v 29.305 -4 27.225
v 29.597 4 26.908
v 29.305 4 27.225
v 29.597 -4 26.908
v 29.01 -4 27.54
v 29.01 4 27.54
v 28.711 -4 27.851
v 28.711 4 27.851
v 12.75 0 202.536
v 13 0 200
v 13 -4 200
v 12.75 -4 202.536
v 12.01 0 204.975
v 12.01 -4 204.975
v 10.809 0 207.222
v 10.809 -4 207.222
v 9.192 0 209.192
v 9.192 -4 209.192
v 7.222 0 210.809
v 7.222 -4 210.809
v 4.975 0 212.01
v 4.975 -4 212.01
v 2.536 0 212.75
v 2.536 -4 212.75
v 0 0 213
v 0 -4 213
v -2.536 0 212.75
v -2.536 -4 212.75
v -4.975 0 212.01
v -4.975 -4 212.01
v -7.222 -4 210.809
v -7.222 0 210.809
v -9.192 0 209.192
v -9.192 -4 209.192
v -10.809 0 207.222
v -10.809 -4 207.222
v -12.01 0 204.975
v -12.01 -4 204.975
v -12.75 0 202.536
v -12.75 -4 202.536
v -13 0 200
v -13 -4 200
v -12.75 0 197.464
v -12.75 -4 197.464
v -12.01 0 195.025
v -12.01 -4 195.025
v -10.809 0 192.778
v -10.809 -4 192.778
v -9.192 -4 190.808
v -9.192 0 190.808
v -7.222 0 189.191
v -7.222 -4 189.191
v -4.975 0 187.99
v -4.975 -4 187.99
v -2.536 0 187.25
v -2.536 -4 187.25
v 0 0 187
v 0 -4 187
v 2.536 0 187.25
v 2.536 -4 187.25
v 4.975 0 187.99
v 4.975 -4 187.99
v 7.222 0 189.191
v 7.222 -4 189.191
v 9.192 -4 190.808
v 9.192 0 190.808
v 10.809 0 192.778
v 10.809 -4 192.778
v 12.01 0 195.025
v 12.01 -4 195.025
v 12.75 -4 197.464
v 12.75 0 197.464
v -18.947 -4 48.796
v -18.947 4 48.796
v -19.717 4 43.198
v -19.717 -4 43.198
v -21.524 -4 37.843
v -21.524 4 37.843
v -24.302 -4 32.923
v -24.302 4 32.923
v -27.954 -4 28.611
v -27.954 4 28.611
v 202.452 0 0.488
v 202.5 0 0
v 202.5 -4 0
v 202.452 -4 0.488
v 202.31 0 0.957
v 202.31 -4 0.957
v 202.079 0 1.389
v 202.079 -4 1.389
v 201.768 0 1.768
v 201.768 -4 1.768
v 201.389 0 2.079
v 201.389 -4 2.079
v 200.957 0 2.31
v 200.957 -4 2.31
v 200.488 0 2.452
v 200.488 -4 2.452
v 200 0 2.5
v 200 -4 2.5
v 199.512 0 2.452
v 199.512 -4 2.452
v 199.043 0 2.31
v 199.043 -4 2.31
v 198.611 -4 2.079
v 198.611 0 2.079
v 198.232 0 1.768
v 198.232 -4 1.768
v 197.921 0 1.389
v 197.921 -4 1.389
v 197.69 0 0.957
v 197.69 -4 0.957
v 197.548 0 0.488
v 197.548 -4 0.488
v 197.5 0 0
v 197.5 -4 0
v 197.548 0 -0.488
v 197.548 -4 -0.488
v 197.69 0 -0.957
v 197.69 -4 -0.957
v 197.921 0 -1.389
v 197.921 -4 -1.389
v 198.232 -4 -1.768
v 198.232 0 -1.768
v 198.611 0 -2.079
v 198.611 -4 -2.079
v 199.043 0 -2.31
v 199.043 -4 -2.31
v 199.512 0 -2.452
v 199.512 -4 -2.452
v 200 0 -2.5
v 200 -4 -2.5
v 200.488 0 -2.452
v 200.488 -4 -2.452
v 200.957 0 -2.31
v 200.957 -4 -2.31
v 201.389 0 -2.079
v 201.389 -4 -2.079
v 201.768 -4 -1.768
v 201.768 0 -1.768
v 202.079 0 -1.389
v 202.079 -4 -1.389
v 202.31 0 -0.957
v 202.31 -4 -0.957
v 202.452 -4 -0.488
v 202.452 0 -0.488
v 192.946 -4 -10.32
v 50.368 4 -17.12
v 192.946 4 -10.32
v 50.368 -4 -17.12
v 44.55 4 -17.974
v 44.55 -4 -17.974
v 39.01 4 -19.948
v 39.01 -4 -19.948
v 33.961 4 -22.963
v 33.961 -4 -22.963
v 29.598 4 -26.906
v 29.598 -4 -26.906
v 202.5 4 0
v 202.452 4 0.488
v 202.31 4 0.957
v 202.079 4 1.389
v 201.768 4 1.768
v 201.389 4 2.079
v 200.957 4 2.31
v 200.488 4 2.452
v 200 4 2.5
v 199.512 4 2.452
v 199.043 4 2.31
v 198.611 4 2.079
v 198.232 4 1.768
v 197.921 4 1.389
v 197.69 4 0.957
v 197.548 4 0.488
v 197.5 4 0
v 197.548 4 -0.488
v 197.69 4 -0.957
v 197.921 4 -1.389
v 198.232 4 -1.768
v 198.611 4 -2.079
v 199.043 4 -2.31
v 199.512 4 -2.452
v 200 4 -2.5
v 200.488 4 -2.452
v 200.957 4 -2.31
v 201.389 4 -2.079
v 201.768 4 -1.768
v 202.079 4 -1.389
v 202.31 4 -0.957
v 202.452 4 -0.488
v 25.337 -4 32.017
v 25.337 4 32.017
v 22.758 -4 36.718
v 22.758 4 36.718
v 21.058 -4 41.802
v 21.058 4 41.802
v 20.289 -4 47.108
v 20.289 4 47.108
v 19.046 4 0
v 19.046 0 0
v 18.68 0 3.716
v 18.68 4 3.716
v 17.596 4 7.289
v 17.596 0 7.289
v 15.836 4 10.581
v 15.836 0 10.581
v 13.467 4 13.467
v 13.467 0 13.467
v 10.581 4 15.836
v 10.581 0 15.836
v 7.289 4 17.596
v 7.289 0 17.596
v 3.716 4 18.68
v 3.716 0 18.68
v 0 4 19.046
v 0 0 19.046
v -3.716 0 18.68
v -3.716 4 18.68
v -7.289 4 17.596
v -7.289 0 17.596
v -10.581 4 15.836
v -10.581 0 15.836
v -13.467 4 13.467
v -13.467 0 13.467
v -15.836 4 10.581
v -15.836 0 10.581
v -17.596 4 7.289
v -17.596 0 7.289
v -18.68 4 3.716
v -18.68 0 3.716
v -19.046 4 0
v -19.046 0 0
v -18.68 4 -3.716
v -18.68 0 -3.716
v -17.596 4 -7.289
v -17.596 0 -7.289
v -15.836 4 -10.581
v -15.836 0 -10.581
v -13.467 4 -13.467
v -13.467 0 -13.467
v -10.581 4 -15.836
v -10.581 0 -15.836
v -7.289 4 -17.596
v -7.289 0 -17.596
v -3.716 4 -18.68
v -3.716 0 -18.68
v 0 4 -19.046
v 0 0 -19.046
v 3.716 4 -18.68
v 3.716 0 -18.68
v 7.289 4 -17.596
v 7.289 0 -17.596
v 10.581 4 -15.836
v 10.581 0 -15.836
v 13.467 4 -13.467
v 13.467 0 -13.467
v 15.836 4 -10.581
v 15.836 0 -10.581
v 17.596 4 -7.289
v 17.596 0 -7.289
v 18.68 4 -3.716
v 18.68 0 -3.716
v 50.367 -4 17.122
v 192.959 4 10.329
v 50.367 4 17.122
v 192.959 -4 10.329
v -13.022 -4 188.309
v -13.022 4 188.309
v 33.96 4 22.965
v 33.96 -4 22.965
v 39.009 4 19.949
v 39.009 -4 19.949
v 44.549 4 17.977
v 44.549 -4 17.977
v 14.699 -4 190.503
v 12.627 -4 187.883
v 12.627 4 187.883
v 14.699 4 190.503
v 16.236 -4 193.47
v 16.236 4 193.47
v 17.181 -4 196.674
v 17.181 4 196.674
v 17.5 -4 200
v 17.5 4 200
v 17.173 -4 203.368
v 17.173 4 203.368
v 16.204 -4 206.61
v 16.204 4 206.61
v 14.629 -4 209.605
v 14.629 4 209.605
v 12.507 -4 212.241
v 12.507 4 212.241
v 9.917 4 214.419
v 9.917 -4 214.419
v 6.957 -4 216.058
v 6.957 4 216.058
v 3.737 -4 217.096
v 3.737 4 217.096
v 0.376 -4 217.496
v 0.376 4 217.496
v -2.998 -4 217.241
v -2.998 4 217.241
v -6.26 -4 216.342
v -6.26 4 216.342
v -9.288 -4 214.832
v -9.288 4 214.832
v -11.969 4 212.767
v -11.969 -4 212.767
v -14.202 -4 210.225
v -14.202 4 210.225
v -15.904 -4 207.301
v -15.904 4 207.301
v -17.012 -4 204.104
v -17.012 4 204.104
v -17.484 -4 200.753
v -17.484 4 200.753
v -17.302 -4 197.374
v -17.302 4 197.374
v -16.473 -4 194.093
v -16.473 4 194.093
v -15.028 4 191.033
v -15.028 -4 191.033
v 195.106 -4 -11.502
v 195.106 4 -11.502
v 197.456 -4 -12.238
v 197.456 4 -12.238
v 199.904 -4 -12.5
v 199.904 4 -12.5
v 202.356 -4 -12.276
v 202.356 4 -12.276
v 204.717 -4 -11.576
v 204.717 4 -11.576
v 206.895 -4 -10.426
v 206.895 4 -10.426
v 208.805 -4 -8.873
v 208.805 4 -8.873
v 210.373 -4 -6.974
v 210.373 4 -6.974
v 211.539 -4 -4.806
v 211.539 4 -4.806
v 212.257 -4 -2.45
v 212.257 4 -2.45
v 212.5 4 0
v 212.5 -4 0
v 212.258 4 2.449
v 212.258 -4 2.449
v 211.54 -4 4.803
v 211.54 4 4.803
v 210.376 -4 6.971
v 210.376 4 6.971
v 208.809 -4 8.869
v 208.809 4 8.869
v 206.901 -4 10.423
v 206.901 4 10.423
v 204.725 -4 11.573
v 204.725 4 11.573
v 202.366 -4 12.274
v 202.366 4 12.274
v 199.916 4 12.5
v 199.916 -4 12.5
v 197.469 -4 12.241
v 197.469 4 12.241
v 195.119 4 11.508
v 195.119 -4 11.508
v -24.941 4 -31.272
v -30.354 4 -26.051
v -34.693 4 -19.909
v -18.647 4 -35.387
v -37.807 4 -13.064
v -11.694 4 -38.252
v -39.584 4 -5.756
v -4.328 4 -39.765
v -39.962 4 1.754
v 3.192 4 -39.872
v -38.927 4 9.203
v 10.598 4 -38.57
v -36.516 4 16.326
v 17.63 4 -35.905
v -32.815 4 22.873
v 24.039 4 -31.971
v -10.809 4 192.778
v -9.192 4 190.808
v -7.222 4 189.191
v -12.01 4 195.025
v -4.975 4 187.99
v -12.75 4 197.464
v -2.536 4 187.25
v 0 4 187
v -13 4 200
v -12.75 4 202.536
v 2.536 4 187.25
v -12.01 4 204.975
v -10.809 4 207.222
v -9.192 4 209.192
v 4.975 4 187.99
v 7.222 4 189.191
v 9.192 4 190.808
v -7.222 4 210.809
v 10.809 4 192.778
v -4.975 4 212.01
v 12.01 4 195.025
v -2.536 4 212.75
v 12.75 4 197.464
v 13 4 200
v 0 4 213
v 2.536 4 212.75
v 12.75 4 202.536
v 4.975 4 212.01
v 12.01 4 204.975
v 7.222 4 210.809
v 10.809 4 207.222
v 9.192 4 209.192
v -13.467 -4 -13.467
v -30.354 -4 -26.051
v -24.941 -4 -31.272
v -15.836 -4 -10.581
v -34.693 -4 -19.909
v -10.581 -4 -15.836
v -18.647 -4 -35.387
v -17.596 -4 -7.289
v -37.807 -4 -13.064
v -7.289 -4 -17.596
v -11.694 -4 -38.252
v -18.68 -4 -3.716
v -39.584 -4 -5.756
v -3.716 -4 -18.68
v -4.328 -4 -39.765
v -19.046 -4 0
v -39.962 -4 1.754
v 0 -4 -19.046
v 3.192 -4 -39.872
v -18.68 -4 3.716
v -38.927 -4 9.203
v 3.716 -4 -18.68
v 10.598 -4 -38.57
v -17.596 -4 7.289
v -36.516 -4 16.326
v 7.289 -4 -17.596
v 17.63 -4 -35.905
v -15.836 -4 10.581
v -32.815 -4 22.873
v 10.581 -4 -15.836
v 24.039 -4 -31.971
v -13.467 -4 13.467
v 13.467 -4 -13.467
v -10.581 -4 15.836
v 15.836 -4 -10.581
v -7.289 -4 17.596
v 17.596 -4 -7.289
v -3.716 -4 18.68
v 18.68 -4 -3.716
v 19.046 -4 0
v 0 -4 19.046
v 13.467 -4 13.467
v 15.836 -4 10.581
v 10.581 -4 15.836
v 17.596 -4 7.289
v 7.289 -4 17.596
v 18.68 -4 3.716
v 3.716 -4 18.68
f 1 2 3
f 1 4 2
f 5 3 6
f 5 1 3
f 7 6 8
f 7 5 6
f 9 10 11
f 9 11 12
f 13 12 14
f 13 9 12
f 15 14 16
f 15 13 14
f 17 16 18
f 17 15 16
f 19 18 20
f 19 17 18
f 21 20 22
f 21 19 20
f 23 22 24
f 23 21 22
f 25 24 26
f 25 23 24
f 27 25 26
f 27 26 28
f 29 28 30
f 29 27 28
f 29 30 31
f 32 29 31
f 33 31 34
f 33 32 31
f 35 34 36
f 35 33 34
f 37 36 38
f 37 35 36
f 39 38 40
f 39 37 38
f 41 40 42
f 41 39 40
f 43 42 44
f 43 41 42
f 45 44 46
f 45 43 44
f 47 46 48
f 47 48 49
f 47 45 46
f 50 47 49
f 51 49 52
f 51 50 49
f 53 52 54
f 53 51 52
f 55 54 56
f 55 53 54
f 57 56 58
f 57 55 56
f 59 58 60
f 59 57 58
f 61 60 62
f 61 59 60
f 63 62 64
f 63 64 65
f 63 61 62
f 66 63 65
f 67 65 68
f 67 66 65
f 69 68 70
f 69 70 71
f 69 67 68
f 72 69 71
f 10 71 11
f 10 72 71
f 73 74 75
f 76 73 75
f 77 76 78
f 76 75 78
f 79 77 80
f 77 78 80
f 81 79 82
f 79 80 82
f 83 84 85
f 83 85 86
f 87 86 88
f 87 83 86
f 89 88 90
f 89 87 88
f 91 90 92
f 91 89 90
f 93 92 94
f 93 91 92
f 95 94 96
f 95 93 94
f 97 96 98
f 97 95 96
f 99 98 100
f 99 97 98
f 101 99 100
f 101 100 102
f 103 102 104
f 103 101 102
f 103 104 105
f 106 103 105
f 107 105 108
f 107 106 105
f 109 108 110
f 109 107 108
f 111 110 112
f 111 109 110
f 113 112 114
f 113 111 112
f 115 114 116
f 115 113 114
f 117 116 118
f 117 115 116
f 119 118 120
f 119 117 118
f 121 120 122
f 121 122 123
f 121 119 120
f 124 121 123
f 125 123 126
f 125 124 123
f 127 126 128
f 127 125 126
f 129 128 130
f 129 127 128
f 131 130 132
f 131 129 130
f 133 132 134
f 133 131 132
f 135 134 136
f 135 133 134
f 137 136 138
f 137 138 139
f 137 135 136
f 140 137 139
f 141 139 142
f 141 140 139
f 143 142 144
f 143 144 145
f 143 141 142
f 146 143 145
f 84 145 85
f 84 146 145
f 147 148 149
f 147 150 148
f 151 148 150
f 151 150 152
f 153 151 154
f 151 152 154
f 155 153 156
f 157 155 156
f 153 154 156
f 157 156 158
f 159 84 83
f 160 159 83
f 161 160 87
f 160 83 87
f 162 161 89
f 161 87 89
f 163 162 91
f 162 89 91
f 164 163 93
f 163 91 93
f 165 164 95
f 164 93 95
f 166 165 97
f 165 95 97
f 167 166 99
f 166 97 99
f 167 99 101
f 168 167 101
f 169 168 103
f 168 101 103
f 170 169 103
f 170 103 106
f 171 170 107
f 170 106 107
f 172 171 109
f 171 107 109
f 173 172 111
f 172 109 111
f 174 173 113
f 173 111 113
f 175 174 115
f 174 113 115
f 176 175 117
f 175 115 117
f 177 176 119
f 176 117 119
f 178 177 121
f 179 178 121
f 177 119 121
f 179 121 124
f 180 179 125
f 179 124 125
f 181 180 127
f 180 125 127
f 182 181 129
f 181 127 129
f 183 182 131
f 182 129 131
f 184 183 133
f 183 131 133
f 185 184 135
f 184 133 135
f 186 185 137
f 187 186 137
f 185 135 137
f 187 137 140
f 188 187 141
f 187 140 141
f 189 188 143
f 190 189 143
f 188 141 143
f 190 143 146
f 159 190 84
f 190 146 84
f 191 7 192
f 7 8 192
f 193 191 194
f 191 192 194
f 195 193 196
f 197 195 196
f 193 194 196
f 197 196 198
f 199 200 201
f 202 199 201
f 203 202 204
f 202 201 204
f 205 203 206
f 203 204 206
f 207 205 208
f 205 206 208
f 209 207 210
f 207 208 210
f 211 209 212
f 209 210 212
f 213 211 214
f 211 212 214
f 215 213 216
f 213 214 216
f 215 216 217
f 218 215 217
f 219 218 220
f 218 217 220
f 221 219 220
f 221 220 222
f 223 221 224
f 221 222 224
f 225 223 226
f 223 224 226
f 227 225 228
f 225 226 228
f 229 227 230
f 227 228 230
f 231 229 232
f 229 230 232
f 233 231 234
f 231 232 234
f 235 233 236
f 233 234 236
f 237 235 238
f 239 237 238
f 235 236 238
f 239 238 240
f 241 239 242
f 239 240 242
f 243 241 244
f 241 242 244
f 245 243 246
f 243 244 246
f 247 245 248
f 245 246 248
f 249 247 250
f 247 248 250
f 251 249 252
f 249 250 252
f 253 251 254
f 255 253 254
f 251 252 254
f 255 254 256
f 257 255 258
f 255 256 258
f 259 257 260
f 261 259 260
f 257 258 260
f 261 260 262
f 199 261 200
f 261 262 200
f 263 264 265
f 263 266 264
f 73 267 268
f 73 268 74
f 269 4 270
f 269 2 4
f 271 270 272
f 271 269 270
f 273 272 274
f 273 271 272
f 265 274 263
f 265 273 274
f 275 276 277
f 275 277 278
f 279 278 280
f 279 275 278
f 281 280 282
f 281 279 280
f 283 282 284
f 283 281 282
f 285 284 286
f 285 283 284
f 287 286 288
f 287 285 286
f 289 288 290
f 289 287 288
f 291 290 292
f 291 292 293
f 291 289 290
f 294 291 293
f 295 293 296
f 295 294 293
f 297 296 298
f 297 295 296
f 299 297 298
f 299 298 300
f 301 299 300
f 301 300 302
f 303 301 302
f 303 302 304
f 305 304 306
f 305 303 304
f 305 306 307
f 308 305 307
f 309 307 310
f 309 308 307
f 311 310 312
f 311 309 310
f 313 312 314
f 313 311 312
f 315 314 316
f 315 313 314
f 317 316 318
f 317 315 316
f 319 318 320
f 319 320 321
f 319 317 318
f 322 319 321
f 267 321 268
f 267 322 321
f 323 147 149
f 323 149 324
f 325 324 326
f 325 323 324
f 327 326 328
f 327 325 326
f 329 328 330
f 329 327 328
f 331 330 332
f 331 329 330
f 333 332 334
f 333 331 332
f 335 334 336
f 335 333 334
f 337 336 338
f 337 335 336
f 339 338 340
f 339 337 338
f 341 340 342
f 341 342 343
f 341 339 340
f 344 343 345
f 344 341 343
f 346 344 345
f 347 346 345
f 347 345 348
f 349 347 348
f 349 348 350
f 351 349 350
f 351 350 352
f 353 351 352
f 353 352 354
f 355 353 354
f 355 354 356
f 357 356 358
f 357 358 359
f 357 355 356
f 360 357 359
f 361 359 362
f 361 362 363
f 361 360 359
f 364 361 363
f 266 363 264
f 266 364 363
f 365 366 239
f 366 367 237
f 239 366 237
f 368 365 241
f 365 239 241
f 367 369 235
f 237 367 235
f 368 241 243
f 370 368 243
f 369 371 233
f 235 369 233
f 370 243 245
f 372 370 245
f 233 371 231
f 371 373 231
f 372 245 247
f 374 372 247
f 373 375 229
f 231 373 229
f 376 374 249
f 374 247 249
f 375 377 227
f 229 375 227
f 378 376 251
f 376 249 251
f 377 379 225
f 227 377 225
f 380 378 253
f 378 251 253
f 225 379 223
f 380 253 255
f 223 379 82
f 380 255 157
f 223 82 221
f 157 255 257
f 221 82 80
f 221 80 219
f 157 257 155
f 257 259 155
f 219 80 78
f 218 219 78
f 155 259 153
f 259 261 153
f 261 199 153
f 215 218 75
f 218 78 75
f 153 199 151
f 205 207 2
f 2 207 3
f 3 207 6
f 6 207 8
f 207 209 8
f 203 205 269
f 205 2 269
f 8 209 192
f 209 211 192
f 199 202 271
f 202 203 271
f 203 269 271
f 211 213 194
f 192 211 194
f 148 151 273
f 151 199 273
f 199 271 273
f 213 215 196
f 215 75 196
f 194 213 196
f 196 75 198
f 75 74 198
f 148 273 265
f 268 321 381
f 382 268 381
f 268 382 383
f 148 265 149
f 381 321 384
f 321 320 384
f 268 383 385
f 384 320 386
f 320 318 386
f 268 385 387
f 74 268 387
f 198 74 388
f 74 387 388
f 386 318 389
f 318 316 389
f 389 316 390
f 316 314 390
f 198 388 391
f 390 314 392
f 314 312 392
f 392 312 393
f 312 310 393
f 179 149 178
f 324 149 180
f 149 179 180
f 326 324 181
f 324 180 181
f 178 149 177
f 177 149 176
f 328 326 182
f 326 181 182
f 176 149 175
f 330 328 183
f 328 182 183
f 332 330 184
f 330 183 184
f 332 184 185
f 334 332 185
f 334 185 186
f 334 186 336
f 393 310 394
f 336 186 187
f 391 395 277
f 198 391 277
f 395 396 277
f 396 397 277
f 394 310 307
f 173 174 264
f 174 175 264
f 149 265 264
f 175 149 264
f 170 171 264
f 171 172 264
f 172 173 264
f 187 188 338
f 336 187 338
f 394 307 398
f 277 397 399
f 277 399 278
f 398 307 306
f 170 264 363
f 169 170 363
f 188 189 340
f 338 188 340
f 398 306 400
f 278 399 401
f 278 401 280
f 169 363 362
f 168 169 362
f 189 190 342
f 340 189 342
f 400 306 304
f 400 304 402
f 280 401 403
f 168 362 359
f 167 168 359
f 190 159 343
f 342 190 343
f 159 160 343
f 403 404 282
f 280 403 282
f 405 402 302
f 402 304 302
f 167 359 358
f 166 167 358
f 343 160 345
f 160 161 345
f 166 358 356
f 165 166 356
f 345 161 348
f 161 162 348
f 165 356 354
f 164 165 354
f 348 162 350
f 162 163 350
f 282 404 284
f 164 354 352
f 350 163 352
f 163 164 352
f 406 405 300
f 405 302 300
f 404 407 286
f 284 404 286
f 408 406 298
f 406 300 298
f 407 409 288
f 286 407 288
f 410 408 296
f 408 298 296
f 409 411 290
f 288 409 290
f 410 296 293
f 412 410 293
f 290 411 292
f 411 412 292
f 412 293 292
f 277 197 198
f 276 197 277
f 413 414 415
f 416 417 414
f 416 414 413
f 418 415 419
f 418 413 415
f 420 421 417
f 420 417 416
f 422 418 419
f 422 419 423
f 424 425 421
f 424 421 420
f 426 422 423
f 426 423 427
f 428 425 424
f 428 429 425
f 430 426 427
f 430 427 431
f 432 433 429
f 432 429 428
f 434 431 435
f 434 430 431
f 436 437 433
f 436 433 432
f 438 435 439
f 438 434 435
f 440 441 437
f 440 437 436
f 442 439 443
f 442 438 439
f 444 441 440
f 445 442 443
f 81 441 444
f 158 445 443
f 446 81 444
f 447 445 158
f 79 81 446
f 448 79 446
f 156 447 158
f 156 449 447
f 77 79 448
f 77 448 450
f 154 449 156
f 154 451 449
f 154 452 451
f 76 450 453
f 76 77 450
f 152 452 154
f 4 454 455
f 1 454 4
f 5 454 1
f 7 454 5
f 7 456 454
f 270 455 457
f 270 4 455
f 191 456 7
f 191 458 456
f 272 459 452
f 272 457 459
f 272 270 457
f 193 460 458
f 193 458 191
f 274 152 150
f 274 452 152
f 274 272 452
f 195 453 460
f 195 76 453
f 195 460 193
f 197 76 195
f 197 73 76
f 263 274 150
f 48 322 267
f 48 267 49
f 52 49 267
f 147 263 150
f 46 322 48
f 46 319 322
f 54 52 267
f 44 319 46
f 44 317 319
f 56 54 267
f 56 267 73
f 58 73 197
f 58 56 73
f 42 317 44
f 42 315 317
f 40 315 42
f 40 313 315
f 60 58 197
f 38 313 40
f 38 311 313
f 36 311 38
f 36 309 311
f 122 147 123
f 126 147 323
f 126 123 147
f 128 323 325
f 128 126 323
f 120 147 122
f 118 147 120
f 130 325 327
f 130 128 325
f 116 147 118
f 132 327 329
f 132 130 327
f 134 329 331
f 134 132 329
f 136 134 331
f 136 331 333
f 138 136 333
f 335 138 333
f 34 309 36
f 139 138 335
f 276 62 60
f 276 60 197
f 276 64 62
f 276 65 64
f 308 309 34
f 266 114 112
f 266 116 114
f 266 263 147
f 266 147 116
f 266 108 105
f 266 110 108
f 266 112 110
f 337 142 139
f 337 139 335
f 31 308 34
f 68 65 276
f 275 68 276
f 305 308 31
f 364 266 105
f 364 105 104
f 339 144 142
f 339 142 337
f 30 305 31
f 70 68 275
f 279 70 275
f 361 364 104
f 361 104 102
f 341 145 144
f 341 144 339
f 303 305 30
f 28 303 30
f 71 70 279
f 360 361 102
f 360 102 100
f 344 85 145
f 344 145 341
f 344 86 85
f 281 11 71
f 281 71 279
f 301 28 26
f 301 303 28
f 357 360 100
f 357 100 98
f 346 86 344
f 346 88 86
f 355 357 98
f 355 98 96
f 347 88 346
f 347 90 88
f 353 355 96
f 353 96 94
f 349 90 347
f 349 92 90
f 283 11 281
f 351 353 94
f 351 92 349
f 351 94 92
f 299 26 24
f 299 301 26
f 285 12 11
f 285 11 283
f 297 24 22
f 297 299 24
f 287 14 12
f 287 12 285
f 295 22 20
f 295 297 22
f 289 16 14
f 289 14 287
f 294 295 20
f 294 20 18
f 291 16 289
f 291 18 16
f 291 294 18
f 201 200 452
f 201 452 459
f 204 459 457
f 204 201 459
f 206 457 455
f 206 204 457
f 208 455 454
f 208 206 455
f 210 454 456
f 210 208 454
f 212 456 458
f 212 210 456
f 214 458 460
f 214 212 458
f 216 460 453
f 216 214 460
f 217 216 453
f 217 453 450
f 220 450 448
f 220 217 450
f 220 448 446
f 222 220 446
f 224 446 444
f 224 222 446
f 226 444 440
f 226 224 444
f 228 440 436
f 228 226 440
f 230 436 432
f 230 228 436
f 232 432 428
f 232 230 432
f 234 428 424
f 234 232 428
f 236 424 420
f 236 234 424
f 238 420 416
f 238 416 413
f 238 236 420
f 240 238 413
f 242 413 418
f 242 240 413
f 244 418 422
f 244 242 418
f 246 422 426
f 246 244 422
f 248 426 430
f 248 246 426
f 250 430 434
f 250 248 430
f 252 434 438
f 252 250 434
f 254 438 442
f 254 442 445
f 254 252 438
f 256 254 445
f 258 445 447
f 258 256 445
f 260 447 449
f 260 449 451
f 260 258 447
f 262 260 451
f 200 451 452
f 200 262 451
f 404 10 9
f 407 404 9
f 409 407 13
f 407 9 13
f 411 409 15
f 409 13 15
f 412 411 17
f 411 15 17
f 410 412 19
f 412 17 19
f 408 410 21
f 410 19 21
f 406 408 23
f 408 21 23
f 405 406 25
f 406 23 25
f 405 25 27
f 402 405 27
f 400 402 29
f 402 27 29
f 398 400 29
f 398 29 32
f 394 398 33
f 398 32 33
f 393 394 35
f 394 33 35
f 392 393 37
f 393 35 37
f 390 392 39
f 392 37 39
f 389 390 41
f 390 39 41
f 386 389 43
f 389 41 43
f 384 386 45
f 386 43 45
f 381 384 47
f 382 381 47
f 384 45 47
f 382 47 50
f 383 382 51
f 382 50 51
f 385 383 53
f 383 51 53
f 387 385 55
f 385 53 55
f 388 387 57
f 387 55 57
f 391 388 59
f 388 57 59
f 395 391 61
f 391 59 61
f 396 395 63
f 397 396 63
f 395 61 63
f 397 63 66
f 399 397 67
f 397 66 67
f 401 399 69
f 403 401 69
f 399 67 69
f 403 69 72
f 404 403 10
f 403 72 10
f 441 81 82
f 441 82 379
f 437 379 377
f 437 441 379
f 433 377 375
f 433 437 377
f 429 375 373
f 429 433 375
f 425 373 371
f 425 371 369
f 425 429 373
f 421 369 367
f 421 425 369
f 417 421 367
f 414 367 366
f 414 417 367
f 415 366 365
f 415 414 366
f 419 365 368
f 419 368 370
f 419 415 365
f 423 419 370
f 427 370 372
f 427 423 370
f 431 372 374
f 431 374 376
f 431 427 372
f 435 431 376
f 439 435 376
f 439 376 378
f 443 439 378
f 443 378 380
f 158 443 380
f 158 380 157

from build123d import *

# Parameters (mm, degrees)
F0_R        = 19.0457812865
F0_R_2      = 13
F0_R_3      = 2.5
F1_DEPTH    = 4
F2_R        = 30
F3_R        = 30
F4_T1_DEPTH = 8
F5_R        = 30


# Not quite as in the source:
# - a fillet or chamfer that OpenCascade refuses, or shapes differently, is made with other operations: its cross-section is extruded or revolved along the edge and cut away or added


with BuildPart() as f1:
    # F0 (on Front) → F1 (new body, symmetric)
    with BuildSketch(Plane.XZ):
        with BuildLine():
            ThreePointArc((-19.5365896508, 34.9044648264), (0.8487956626, 39.99099331), (21, 34.0440890611))
            Line((21, 34.0440890611), (12.6265428967, 187.8830525924))
            ThreePointArc((12.6265428967, 187.8830525924), (-0.2904480488, 182.5024104537), (-13.0217419566, 188.3087966224))
            Line((-13.0217419566, 188.3087966224), (-19.5365896508, 34.9044648264))
        make_face()
        with BuildLine():
            ThreePointArc((35.8133699363, 17.8157945038), (38.939278354, 9.1505519655), (40, 0))
            ThreePointArc((40, 0), (38.9395050251, -9.1495873352), (35.8142525798, -17.8140201007))
            Line((35.8142525798, -17.8140201007), (192.9463185859, -10.3196694961))
            ThreePointArc((192.9463185859, -10.3196694961), (187.5000024995, 0.0079048318), (192.9593762653, 10.3285825468))
            Line((192.9593762653, 10.3285825468), (35.8133699363, 17.8157945038))
        make_face()
        with BuildLine():
            ThreePointArc((35.8142525798, -17.8140201007), (38.9395050251, -9.1495873352), (40, 0))
            ThreePointArc((40, 0), (38.939278354, 9.1505519655), (35.8133699363, 17.8157945038))
            ThreePointArc((35.8133699363, 17.8157945038), (29.542835628, 26.9670328931), (21, 34.0440890611))
            ThreePointArc((21, 34.0440890611), (0.8487956626, 39.99099331), (-19.5365896508, 34.9044648264))
            ThreePointArc((-19.5365896508, 34.9044648264), (-27.5871390481, -28.9646294494), (35.8142525798, -17.8140201007))
        make_face()
        Circle(F0_R, mode=Mode.SUBTRACT)
        with BuildLine():
            ThreePointArc((-13.0217419566, 188.3087966224), (-0.2904480488, 182.5024104537), (12.6265428967, 187.8830525924))
            ThreePointArc((12.6265428967, 187.8830525924), (16.2359862757, 193.4698583741), (17.5, 200))
            ThreePointArc((17.5, 200), (-6.2597729895, 216.3421308929), (-13.0217419566, 188.3087966224))
        make_face()
        with Locations((0, 200)):
            Circle(F0_R_2, mode=Mode.SUBTRACT)
        with BuildLine():
            ThreePointArc((212.5, 0), (205.841327046, 11.0511944306), (192.9593762653, 10.3285825468))
            ThreePointArc((192.9593762653, 10.3285825468), (187.5000024995, 0.0079048318), (192.9463185859, -10.3196694961))
            ThreePointArc((192.9463185859, -10.3196694961), (205.8343372513, -11.0548861974), (212.5, 0))
        make_face()
        with Locations((200, 0)):
            Circle(F0_R_3, mode=Mode.SUBTRACT)
    extrude(amount=F1_DEPTH, both=True)

    # F2
    f2_edges = [f1.edges().sort_by_distance(p)[0] for p in [
        (35.81337, 0, 17.815795),
    ]]
    fillet(f2_edges, radius=F2_R)

    # F3
    f3_edges = [f1.edges().sort_by_distance(p)[0] for p in [
        (21, 0, 34.044089),
    ]]
    fillet(f3_edges, radius=F3_R)

    # F4: fillet of radius 30 on 1 edges, made by hand

    # F4_s2 → F4_t1 (join)
    with BuildSketch(Plane.XZ.offset(-4)):
        with BuildLine():
            ThreePointArc((-18.9466482885, 48.7957428331), (-21.5235892515, 37.8433937284), (-27.954075006, 28.6106569403))
            ThreePointArc((-27.954075006, 28.6106569403), (-23.9529499606, 32.0352335435), (-19.5365896508, 34.9044648264))
            Line((-19.5365896508, 34.9044648264), (-18.9466482885, 48.7957428331))
        make_face()
    extrude(amount=F4_T1_DEPTH)

    # F5
    f5_edges = [f1.edges().sort_by_distance(p)[0] for p in [
        (35.814253, 0, -17.81402),
    ]]
    fillet(f5_edges, radius=F5_R)


solid = f1.part
